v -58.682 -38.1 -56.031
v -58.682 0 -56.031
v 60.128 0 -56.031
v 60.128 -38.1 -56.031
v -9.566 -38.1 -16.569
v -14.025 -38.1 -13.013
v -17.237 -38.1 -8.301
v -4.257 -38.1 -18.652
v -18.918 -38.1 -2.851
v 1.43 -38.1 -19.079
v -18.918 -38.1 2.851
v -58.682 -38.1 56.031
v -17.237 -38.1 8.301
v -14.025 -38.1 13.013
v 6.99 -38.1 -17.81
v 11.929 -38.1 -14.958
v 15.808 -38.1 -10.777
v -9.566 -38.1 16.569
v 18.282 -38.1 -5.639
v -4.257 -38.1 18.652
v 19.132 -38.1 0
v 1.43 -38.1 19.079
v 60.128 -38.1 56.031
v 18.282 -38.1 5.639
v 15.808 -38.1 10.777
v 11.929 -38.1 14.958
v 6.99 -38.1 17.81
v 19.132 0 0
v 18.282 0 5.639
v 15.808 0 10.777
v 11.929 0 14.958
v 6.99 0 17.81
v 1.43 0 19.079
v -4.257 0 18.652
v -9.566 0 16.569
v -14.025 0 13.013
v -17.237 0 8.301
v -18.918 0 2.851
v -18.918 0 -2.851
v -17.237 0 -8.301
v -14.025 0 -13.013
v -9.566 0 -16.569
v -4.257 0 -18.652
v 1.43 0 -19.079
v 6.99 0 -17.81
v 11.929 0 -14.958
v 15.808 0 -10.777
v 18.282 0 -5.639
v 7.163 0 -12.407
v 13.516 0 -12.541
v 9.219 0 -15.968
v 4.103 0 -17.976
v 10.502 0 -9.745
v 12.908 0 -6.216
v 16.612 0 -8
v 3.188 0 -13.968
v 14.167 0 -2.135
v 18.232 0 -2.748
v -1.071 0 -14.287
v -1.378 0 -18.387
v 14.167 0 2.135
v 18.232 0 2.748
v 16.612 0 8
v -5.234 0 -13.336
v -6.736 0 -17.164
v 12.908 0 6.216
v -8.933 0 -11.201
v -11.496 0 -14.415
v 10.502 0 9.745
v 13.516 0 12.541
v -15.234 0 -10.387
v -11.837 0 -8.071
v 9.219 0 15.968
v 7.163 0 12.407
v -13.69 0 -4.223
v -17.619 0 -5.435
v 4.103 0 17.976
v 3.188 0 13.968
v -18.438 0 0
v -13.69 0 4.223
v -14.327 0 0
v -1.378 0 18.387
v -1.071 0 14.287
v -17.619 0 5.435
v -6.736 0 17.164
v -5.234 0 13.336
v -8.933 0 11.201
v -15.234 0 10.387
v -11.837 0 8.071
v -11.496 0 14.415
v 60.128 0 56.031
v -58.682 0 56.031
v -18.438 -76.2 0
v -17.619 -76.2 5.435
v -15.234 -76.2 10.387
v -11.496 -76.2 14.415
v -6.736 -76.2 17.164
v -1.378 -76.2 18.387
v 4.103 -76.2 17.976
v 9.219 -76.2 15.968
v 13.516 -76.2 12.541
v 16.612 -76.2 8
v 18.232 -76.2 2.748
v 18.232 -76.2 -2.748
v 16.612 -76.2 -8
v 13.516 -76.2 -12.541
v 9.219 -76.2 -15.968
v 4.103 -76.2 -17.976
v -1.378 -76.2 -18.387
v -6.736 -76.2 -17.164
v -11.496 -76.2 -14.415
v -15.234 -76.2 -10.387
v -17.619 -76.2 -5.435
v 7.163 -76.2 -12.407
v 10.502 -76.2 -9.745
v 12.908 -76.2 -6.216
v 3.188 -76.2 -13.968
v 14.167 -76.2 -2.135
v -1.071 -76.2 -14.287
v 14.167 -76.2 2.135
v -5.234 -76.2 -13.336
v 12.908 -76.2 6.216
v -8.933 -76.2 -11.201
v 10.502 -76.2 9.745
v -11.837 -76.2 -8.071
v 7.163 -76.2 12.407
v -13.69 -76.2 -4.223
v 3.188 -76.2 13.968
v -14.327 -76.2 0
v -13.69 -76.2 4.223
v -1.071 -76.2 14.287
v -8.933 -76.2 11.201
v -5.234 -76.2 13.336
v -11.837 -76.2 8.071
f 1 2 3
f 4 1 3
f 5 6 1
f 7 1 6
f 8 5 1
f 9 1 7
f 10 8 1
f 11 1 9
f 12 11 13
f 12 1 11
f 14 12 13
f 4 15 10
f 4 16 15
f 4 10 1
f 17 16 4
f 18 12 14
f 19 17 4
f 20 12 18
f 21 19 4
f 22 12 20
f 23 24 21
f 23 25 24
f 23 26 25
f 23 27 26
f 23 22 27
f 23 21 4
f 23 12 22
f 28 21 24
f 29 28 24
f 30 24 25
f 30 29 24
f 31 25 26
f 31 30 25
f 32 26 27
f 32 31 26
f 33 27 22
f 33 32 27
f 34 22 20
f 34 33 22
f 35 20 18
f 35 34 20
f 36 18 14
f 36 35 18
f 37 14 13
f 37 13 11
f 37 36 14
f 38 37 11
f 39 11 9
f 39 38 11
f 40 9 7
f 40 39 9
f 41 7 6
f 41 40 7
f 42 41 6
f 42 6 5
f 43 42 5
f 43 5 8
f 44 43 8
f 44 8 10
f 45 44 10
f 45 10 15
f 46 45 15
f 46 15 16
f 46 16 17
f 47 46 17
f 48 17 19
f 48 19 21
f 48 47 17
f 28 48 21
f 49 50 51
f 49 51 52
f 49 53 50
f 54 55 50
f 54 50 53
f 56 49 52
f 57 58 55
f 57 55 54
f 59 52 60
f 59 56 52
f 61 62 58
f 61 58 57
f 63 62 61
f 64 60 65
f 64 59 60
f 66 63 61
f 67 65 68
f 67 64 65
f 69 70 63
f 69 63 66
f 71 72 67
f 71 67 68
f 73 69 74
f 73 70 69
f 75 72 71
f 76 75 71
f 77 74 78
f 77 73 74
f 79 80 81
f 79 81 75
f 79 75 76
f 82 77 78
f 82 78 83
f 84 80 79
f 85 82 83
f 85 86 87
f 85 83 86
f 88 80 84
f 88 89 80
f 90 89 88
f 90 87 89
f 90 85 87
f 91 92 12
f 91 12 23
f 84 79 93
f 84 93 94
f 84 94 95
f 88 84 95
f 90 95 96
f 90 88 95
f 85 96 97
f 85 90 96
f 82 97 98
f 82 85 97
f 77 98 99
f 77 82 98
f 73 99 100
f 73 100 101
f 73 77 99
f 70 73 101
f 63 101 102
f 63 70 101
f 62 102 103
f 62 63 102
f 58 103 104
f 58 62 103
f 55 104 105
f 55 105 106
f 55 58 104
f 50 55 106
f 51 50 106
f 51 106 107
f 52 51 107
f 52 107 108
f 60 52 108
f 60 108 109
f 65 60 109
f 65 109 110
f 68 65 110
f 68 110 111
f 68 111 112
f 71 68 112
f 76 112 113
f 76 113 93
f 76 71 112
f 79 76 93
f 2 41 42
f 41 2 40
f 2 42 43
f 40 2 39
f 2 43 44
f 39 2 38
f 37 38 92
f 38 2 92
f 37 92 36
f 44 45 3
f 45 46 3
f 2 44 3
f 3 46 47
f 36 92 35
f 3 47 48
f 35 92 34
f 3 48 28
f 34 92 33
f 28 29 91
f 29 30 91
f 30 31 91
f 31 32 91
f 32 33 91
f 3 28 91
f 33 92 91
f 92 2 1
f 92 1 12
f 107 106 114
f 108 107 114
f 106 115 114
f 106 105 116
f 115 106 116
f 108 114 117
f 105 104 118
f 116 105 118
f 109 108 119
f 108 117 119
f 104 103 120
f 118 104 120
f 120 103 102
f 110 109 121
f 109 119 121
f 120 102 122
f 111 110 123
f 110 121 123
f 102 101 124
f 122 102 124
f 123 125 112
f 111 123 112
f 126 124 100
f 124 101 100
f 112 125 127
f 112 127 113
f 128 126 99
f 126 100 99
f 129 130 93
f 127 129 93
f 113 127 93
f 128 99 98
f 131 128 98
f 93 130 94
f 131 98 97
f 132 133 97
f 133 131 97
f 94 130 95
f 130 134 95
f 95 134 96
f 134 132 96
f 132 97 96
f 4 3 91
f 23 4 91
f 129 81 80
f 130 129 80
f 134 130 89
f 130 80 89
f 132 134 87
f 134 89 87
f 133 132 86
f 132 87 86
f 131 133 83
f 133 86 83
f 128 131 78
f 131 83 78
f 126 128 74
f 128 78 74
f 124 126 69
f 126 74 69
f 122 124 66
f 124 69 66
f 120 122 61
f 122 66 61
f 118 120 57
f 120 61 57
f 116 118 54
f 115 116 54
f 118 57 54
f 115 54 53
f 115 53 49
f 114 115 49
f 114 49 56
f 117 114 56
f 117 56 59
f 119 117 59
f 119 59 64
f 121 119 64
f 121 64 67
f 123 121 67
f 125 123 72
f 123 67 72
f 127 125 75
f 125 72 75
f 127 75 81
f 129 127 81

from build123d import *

# Parameters (mm, degrees)
F0_W     = 118.810031563
F0_H     = 112.0622009039
F0_R     = 25.5981657893
F0_R_2   = 19.1321000997
F1_DEPTH = 38.1
F2_R     = 18.4380627175
F2_R_2   = 14.3268495372
F3_DEPTH = 76.2


with BuildPart() as f1:
    # F0 (on Front) → F1 (new body)
    with BuildSketch(Plane.XZ):
        with Locations((0.722983852, 0)):
            Rectangle(F0_W, F0_H)
        Circle(F0_R, mode=Mode.SUBTRACT)
        Circle(F0_R)
        Circle(F0_R_2, mode=Mode.SUBTRACT)
    extrude(amount=F1_DEPTH)


with BuildPart() as f3:
    # F2 (on face) → F3 (new body)
    with BuildSketch(Plane(origin=(0, 0, 0), x_dir=(-1, 0, 0), z_dir=(0, 1, 0))):
        Circle(F2_R)
        Circle(F2_R_2, mode=Mode.SUBTRACT)
    extrude(amount=-F3_DEPTH)


solid = Compound([f1.part, f3.part])
